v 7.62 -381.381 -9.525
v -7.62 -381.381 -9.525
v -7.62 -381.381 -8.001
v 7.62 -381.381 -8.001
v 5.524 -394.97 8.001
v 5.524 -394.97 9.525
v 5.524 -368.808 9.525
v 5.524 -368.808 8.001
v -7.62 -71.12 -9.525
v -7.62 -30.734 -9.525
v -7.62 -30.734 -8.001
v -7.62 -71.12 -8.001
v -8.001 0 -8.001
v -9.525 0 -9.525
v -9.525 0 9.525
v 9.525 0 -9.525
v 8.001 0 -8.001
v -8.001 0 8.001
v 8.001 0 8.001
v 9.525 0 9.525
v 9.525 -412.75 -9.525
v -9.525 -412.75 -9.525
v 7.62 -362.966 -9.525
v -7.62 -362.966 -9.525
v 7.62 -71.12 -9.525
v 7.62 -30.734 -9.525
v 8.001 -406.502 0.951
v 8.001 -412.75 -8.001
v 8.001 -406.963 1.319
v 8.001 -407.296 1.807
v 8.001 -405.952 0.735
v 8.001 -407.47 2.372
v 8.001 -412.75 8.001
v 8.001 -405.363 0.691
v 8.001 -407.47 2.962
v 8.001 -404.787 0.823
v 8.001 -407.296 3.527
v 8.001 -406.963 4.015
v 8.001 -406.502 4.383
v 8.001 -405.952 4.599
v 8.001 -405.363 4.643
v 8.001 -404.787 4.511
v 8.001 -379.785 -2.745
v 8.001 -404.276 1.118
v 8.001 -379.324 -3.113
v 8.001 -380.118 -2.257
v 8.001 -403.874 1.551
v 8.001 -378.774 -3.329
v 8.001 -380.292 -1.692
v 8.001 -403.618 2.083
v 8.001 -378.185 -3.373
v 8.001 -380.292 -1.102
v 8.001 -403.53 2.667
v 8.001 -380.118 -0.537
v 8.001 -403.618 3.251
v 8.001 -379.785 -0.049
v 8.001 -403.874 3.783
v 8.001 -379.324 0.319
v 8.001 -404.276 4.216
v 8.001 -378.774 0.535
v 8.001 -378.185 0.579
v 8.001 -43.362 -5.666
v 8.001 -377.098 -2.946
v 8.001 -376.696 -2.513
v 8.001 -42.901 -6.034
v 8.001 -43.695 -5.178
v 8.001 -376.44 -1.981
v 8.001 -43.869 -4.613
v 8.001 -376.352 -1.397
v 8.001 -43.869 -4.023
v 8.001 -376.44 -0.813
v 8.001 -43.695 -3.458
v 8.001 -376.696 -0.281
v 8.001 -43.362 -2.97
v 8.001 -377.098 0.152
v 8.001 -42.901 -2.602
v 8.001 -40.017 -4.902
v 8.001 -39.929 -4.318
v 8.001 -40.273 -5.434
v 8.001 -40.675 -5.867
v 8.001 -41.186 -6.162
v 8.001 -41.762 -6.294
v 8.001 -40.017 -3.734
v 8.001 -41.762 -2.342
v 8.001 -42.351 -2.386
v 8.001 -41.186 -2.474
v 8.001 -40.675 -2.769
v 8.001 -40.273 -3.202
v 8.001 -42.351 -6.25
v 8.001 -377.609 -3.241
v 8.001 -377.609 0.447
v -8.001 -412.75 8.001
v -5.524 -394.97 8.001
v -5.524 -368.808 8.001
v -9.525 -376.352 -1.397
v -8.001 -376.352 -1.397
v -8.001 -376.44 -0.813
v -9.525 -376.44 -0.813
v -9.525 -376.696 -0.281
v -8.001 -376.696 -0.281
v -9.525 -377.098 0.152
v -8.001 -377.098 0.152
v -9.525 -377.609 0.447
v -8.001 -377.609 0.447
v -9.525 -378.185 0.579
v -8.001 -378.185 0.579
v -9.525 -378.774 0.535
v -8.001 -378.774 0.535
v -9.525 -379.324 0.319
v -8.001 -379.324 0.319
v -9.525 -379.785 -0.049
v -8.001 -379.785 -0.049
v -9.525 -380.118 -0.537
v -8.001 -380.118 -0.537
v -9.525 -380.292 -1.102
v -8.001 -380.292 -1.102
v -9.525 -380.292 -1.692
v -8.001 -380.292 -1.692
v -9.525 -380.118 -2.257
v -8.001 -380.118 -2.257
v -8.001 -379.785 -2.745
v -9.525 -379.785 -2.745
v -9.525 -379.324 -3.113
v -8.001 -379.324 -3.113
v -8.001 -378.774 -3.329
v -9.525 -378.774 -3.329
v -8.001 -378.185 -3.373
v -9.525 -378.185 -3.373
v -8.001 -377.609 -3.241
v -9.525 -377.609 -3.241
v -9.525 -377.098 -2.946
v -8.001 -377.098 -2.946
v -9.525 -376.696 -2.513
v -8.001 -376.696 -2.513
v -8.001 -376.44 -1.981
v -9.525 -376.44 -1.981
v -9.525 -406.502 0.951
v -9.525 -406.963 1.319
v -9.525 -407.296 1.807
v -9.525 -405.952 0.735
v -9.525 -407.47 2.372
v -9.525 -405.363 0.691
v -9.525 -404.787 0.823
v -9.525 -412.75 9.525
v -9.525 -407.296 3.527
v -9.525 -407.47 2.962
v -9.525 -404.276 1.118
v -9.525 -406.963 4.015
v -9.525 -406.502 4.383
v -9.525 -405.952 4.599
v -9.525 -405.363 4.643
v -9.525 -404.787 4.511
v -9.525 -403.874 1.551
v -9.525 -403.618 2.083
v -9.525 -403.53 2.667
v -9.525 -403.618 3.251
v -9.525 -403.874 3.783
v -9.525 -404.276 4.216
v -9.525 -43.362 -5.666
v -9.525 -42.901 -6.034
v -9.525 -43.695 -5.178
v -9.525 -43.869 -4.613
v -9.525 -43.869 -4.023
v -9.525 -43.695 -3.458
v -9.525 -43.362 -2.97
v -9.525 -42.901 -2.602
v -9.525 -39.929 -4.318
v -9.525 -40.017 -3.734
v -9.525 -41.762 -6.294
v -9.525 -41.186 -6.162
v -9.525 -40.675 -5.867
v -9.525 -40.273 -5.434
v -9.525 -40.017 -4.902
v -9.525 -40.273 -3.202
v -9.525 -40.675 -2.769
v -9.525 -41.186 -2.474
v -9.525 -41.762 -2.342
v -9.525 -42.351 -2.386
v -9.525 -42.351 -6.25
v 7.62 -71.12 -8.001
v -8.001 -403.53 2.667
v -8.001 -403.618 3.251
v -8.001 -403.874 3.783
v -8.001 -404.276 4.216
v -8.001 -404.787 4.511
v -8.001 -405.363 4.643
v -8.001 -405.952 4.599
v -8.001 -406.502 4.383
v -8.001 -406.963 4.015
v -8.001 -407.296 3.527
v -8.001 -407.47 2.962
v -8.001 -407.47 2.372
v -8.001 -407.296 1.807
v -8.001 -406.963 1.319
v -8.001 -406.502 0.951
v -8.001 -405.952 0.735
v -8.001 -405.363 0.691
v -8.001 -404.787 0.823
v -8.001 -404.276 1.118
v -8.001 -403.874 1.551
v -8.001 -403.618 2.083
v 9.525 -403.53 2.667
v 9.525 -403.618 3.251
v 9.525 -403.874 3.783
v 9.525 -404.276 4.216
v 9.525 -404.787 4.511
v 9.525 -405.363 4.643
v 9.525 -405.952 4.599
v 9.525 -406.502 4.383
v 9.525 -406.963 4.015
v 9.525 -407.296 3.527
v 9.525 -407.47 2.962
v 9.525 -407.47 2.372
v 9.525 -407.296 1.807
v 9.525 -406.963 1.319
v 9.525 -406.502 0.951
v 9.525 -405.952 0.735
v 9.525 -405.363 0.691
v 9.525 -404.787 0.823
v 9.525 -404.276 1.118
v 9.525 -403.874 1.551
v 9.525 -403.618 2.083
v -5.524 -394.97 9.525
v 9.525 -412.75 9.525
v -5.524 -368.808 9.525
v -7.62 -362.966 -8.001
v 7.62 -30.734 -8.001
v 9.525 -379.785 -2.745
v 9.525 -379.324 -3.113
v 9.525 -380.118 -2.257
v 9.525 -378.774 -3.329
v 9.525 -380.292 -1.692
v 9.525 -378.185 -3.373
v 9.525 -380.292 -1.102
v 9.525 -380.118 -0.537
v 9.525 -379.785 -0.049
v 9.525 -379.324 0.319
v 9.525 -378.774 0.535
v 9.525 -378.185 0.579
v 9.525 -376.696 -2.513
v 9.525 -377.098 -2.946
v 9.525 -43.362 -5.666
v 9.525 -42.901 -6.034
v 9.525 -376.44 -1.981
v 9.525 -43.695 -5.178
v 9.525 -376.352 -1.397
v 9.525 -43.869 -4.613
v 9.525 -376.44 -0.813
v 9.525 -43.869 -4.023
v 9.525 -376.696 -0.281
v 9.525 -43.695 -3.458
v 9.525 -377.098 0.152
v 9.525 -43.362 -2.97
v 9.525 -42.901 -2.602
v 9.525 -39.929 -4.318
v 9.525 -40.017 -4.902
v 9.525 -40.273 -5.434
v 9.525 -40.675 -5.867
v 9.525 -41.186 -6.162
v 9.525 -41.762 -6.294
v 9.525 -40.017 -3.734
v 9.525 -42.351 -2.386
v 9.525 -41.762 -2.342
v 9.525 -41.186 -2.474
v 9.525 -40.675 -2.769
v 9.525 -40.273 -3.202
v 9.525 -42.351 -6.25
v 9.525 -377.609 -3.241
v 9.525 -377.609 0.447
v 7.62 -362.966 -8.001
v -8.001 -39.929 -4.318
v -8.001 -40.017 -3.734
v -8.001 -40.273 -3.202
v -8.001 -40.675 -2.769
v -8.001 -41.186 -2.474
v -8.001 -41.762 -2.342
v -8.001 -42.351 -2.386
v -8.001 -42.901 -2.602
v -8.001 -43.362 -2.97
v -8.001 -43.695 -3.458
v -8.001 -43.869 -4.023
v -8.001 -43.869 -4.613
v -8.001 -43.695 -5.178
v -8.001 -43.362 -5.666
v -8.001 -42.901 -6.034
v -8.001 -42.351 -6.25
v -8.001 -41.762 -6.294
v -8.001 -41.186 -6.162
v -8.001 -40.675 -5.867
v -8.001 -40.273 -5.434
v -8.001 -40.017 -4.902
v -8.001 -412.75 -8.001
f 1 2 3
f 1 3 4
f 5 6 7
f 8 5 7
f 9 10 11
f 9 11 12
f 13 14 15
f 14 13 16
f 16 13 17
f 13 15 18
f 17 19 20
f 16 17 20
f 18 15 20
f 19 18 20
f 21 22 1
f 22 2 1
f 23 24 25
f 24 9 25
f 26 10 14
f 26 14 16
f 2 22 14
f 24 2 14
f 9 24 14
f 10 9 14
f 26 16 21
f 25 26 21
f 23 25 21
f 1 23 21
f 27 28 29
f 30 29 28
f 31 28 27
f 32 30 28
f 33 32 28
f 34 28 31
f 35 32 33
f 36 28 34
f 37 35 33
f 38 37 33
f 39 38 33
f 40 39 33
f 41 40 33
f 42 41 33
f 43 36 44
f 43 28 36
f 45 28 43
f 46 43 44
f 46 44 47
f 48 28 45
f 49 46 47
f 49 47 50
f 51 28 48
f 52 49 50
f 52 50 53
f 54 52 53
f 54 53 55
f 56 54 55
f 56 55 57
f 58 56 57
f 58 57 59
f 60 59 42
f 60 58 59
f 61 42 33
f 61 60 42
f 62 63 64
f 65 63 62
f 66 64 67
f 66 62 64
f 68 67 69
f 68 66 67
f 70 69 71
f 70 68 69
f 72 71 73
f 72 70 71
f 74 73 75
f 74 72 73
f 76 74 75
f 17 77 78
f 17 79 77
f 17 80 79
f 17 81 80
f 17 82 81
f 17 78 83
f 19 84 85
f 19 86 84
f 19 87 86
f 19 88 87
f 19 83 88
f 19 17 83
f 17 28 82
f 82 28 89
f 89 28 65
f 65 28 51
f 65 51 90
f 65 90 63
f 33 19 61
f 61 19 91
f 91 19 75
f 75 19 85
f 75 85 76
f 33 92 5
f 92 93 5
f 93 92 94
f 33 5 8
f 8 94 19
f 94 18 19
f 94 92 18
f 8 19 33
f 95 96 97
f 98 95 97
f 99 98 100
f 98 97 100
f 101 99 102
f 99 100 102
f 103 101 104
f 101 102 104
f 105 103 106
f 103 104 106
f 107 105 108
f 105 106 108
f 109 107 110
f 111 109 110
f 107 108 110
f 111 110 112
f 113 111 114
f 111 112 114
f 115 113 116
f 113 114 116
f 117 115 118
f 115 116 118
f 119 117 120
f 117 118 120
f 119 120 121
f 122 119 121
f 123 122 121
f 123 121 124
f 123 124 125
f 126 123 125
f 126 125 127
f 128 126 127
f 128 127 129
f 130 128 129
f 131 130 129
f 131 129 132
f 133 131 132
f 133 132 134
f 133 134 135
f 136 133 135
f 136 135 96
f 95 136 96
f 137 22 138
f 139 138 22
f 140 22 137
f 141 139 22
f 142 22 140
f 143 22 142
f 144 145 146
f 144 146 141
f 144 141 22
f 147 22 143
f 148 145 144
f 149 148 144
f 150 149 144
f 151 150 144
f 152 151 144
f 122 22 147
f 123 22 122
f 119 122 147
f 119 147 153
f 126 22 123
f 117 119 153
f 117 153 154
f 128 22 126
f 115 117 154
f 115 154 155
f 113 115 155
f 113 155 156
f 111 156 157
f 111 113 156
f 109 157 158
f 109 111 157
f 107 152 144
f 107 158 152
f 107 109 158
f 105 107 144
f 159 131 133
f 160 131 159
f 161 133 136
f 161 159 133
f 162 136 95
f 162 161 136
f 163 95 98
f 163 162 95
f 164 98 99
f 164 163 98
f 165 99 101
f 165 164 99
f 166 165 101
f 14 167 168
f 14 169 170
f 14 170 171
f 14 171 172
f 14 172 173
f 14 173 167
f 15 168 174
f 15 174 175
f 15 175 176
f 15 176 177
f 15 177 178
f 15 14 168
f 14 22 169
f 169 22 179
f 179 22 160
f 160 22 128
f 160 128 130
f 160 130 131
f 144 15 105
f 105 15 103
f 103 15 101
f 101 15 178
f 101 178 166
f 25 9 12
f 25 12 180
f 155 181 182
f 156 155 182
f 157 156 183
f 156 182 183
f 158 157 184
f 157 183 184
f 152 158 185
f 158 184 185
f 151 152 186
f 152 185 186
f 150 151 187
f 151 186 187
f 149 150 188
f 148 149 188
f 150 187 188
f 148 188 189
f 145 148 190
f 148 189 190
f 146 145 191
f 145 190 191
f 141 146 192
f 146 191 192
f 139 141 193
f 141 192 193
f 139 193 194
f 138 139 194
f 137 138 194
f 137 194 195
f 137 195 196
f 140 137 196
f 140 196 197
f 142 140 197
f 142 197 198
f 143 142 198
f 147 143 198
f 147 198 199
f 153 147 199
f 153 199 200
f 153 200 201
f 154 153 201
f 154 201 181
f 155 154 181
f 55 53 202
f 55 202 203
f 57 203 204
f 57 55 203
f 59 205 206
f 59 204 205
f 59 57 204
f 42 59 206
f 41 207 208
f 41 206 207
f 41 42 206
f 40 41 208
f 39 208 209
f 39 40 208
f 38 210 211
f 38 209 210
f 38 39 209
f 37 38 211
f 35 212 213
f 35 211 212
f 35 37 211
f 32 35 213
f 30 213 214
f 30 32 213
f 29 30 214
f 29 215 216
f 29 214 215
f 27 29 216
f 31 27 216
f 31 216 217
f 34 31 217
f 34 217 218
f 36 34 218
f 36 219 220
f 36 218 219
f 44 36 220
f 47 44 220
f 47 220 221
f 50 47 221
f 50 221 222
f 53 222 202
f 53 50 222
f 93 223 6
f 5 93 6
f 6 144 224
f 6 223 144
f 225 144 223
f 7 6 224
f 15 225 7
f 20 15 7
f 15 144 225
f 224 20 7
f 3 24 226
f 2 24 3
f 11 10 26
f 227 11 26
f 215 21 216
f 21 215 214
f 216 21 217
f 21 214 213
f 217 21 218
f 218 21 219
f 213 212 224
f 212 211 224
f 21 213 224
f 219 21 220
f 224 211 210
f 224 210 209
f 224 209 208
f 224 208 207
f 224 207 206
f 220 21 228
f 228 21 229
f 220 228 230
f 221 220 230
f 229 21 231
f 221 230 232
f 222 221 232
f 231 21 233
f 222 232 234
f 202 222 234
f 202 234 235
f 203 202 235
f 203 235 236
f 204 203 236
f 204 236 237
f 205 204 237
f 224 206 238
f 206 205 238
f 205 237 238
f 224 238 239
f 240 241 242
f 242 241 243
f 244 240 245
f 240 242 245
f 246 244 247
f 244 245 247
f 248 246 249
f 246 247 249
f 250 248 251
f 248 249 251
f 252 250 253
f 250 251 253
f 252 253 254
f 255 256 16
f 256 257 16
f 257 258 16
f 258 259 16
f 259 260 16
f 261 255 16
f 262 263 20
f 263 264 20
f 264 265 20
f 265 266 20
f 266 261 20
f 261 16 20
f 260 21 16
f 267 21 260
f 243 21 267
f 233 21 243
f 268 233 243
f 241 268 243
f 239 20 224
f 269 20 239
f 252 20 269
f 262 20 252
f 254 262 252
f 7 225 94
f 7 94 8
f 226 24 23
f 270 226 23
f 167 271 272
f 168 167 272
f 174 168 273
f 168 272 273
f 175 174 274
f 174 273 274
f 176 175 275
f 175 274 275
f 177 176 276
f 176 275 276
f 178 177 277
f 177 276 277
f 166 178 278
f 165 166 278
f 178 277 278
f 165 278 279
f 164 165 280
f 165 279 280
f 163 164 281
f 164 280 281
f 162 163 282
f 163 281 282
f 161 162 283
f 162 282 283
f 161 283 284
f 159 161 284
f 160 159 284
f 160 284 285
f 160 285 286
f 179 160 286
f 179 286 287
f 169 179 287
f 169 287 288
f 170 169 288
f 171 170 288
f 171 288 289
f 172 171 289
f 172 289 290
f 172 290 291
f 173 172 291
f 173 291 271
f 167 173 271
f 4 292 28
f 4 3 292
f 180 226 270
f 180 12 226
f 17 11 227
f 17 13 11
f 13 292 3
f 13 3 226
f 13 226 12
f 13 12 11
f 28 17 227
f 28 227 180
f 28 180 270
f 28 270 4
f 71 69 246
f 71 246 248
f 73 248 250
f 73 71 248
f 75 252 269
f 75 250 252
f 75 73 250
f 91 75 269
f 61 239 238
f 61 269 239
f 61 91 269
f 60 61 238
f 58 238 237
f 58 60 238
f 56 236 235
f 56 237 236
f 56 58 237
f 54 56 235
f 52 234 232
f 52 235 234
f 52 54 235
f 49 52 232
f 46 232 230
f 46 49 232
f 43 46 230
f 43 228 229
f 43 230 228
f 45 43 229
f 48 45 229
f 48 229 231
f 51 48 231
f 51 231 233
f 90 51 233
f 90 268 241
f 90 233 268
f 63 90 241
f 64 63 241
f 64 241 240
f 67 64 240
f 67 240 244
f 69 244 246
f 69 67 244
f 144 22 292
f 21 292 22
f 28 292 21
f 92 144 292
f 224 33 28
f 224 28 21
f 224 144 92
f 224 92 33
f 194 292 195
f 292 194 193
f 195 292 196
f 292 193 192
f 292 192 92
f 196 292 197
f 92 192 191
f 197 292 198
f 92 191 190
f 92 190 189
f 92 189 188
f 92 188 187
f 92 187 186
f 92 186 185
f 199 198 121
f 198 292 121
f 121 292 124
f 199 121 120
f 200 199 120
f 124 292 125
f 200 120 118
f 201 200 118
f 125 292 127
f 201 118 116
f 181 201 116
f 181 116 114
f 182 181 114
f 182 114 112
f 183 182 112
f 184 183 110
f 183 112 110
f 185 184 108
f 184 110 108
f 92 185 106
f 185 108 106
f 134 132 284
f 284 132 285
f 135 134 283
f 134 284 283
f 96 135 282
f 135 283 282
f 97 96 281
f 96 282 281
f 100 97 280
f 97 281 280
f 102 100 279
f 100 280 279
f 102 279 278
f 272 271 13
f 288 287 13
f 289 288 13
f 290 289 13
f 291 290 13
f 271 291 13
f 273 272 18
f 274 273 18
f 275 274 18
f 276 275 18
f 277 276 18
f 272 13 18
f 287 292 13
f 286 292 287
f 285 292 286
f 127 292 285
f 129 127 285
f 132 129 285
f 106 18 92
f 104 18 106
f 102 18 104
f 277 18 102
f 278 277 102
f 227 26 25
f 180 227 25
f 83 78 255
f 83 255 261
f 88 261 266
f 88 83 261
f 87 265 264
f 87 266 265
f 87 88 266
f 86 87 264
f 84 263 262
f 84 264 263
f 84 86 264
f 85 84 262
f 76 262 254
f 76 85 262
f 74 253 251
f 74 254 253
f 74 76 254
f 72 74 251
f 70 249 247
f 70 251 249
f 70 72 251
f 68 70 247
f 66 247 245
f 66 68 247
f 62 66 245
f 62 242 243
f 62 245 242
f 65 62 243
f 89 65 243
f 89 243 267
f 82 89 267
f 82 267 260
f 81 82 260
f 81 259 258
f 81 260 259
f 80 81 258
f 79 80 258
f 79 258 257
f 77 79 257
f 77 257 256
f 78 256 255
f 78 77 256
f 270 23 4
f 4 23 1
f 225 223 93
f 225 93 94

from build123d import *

# Parameters (mm, degrees)
F0_W          = 19.05
F0_H          = 19.05
F0_W_2        = 16.002
F0_H_2        = 16.002
F1_DEPTH      = 412.75
F2_R          = 1.9812
F3_DEPTH      = 25.4
F3_DEPTH_BACK = 25.4
F4_W          = 15.24
F4_H          = 40.386
F4_H_2        = 18.415
F5_DEPTH      = 6.35
F6_W          = 11.049
F6_H          = 26.162
F7_DEPTH      = 6.35


with BuildPart() as f1:
    # F0 (on Front) → F1 (new body)
    with BuildSketch(Plane.XZ):
        Rectangle(F0_W, F0_H)
        Rectangle(F0_W_2, F0_H_2, mode=Mode.SUBTRACT)
    extrude(amount=F1_DEPTH)

    # F2 (on Right) → F3 (cut, two sides)
    with BuildSketch(Plane.YZ) as f3_sk:
        with Locations((-405.511, 2.667)):
            Circle(F2_R)
        with Locations((-378.333, -1.397)):
            Circle(F2_R)
        with Locations((-41.91, -4.318)):
            Circle(F2_R)
    extrude(amount=-F3_DEPTH, mode=Mode.SUBTRACT)
    extrude(f3_sk.sketch, amount=F3_DEPTH_BACK, mode=Mode.SUBTRACT)

    # F4 (on face) → F5 (cut)
    with BuildSketch(Plane(origin=(0, 0, -9.525), x_dir=(1, 0, 0), z_dir=(0, 0, -1))):
        with Locations((0, 50.927)):
            Rectangle(F4_W, F4_H)
        with Locations((0, 372.1735)):
            Rectangle(F4_W, F4_H_2)
    extrude(amount=-F5_DEPTH, mode=Mode.SUBTRACT)

    # F6 (on face) → F7 (cut)
    with BuildSketch(Plane.XY.offset(9.525)):
        with Locations((0, -381.889)):
            Rectangle(F6_W, F6_H)
    extrude(amount=-F7_DEPTH, mode=Mode.SUBTRACT)


solid = f1.part
